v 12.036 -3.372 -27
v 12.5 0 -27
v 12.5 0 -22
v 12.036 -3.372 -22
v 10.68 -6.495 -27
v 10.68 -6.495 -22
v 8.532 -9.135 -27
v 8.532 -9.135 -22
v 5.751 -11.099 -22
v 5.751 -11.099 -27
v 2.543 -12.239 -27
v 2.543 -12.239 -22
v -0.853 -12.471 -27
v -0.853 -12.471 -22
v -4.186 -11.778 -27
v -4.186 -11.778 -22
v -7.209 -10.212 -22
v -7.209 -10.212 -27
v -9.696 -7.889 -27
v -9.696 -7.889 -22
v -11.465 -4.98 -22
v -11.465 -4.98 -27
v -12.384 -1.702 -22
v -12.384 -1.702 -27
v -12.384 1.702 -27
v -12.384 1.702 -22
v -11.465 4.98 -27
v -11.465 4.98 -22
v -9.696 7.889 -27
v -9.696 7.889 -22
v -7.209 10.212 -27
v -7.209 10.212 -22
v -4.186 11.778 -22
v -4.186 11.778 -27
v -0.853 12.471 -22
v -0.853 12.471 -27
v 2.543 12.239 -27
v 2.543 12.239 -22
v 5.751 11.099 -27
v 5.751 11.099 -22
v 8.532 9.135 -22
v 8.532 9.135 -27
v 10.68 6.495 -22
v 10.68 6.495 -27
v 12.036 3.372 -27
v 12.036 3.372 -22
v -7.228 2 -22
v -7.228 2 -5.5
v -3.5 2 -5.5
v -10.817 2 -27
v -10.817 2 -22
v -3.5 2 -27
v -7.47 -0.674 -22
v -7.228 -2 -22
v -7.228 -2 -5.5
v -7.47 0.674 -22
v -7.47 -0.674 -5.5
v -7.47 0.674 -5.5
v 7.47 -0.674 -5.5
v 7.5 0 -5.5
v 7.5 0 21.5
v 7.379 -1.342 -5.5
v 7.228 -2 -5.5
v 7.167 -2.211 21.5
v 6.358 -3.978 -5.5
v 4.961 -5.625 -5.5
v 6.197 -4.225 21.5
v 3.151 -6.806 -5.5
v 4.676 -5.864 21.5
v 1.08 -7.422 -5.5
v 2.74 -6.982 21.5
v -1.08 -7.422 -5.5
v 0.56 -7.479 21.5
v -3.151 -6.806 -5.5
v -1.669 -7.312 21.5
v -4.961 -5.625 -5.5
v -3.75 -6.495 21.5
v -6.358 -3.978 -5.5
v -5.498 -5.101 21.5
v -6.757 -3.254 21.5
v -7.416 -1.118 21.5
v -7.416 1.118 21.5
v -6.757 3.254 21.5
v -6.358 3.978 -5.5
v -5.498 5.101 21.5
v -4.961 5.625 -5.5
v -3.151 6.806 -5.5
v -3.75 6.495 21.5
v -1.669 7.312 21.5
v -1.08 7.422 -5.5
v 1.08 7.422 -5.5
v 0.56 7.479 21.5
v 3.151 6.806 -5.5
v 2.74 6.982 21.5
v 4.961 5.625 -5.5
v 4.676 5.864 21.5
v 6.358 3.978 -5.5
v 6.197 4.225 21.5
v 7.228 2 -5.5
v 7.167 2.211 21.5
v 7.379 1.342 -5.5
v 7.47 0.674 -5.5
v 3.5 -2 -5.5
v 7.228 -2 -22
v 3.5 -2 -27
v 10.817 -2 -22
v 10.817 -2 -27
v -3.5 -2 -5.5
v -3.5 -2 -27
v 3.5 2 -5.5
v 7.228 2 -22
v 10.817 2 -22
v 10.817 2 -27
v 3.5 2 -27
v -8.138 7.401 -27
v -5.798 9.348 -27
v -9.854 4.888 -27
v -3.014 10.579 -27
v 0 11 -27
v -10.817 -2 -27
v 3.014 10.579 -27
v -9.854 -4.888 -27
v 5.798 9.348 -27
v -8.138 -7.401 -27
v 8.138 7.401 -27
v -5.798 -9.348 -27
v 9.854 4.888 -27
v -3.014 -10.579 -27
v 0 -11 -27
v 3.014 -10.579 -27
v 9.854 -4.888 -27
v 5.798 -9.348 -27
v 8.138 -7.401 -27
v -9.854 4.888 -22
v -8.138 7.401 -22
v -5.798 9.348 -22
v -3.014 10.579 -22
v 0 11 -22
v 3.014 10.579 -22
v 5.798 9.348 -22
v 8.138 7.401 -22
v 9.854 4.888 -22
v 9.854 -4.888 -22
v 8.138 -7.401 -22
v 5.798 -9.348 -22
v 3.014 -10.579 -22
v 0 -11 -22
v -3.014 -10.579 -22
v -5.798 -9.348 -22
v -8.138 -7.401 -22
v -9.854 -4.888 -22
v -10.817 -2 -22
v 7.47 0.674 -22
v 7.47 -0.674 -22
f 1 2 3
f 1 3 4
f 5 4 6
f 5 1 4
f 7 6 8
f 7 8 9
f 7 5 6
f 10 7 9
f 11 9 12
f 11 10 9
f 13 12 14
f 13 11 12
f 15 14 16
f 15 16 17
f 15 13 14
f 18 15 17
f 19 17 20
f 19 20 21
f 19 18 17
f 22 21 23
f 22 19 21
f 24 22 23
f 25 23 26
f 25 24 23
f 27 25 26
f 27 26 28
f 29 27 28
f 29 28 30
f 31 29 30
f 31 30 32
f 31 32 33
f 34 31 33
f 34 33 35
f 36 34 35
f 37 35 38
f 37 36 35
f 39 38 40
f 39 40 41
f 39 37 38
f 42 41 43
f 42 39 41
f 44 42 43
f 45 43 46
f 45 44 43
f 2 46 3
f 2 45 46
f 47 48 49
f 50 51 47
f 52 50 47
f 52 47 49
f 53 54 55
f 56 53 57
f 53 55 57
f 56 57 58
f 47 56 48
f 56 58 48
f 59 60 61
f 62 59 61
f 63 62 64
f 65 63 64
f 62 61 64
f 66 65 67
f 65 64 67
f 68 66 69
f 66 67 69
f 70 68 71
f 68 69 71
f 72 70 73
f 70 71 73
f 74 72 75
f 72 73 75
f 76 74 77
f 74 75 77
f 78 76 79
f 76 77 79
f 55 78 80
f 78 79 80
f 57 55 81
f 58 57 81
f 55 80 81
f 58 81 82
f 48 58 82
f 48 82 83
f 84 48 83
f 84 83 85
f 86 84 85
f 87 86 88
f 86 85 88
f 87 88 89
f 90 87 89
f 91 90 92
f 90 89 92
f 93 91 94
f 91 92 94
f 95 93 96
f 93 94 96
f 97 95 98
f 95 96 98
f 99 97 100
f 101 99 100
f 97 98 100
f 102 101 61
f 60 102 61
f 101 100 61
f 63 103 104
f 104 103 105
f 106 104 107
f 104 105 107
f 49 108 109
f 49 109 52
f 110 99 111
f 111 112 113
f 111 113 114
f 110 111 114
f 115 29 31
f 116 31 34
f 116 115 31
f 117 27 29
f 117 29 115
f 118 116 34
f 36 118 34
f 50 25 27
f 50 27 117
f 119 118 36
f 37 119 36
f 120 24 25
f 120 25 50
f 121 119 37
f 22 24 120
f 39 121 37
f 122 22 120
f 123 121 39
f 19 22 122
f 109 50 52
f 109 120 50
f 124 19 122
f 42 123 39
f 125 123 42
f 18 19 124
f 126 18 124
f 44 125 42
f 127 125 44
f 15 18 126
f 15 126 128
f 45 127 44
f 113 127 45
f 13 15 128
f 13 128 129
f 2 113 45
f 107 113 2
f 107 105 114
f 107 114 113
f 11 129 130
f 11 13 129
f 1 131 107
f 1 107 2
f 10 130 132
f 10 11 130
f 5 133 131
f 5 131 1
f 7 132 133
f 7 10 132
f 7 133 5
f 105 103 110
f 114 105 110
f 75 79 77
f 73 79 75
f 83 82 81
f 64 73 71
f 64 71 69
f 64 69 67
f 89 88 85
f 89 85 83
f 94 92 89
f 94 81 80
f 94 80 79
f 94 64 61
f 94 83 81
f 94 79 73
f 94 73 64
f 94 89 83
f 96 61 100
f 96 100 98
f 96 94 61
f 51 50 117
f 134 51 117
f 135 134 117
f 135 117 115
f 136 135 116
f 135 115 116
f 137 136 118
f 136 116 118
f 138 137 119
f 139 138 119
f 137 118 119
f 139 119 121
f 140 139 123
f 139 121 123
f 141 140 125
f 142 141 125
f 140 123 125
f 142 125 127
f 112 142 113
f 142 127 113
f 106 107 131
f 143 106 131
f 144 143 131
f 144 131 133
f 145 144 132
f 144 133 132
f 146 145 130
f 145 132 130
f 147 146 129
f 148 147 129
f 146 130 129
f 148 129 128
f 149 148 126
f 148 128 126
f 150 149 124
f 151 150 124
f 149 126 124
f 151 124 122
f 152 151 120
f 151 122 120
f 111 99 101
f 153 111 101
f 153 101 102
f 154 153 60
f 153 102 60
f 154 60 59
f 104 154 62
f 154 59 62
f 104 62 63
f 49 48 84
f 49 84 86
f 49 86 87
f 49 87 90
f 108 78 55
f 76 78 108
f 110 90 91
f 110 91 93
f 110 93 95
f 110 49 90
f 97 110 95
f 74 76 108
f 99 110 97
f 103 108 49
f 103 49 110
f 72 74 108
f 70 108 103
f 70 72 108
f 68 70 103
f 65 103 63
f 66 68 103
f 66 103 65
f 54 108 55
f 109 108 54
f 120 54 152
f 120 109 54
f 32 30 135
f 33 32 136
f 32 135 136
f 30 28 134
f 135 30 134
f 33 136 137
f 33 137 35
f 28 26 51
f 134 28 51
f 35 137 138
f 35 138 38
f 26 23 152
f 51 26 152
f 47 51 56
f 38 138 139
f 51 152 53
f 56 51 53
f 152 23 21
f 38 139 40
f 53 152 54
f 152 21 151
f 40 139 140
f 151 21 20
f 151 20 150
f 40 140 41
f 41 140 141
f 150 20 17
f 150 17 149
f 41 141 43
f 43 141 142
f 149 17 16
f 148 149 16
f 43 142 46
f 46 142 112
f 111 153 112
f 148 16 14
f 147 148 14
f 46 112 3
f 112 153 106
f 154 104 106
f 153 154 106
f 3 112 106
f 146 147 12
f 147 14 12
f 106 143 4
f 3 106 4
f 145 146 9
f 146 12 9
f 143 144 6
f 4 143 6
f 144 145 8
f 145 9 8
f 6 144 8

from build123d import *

# Parameters (mm, degrees)
SKETCH_R     = 7.5
PAD_DEPTH    = 9
SKETCH001_R  = 7.5
PAD001_DEPTH = 2
SKETCH002_R  = 7.5
PAD002_DEPTH = 9
SKETCH003_R  = 7.5
PAD003_DEPTH = 1.5
SKETCH004_R  = 7.5
PAD004_DEPTH = 5.5
PAD005_DEPTH = 21.5
SKETCH006_R  = 12.5
PAD006_DEPTH = 5


with BuildPart() as part:
    # Sketch → Pad (new body)
    with BuildSketch(Plane.XY):
        Circle(SKETCH_R)
    extrude(amount=PAD_DEPTH)

    # Sketch001 (on Face3 of Pad) → Pad001 (join)
    with BuildSketch(Plane.XY.offset(9)):
        Circle(SKETCH001_R)
    extrude(amount=PAD001_DEPTH)

    # Sketch002 (on Face4 of Pad001) → Pad002 (join)
    with BuildSketch(Plane.XY.offset(11)):
        Circle(SKETCH002_R)
    extrude(amount=PAD002_DEPTH)

    # Sketch003 (on Face5 of Pad002) → Pad003 (join)
    with BuildSketch(Plane.XY.offset(20)):
        Circle(SKETCH003_R)
    extrude(amount=PAD003_DEPTH)

    # Sketch004 (on Face2 of Pad003) → Pad004 (join)
    with BuildSketch(Plane(origin=(0, 0, 0), x_dir=(1, 0, 0), z_dir=(0, 0, -1))):
        Circle(SKETCH004_R)
    extrude(amount=PAD004_DEPTH)

    # Sketch005 (on Face4 of Pad004) → Pad005 (join)
    with BuildSketch(Plane(origin=(0, 0, -5.5), x_dir=(1, 0, 0), z_dir=(0, 0, -1))):
        with BuildLine():
            Line((3.5, 2), (3.5, -2))
            Line((3.5, -2), (7.228416, -2))
            ThreePointArc((7.228416, -2), (7.5, 0), (7.228416, 2))
            Line((3.5, 2), (7.228416, 2))
        make_face()
        with BuildLine():
            Line((-3.5, 2), (-3.5, -2))
            Line((-3.5, -2), (-7.228416, -2))
            ThreePointArc((-7.228416, 2), (-7.5, 0), (-7.228416, -2))
            Line((-3.5, 2), (-7.228416, 2))
        make_face()
    extrude(amount=PAD005_DEPTH)

    # Sketch006 (on Face15 of Pad005) → Pad006 (join)
    with BuildSketch(Plane(origin=(0, 0, -27), x_dir=(1, 0, 0), z_dir=(0, 0, -1))):
        Circle(SKETCH006_R)
        with BuildLine():
            ThreePointArc((10.816654, 2), (0, 11), (-10.816654, 2))
            Line((-3.5, 2), (-10.816654, 2))
            Line((-3.5, -2), (-3.5, 2))
            Line((-10.816654, -2), (-3.5, -2))
            ThreePointArc((-10.816654, -2), (0, -11), (10.816654, -2))
            Line((10.816654, -2), (3.5, -2))
            Line((3.5, -2), (3.5, 2))
            Line((3.5, 2), (10.816654, 2))
        make_face(mode=Mode.SUBTRACT)
    extrude(amount=-PAD006_DEPTH)


solid = part.part
